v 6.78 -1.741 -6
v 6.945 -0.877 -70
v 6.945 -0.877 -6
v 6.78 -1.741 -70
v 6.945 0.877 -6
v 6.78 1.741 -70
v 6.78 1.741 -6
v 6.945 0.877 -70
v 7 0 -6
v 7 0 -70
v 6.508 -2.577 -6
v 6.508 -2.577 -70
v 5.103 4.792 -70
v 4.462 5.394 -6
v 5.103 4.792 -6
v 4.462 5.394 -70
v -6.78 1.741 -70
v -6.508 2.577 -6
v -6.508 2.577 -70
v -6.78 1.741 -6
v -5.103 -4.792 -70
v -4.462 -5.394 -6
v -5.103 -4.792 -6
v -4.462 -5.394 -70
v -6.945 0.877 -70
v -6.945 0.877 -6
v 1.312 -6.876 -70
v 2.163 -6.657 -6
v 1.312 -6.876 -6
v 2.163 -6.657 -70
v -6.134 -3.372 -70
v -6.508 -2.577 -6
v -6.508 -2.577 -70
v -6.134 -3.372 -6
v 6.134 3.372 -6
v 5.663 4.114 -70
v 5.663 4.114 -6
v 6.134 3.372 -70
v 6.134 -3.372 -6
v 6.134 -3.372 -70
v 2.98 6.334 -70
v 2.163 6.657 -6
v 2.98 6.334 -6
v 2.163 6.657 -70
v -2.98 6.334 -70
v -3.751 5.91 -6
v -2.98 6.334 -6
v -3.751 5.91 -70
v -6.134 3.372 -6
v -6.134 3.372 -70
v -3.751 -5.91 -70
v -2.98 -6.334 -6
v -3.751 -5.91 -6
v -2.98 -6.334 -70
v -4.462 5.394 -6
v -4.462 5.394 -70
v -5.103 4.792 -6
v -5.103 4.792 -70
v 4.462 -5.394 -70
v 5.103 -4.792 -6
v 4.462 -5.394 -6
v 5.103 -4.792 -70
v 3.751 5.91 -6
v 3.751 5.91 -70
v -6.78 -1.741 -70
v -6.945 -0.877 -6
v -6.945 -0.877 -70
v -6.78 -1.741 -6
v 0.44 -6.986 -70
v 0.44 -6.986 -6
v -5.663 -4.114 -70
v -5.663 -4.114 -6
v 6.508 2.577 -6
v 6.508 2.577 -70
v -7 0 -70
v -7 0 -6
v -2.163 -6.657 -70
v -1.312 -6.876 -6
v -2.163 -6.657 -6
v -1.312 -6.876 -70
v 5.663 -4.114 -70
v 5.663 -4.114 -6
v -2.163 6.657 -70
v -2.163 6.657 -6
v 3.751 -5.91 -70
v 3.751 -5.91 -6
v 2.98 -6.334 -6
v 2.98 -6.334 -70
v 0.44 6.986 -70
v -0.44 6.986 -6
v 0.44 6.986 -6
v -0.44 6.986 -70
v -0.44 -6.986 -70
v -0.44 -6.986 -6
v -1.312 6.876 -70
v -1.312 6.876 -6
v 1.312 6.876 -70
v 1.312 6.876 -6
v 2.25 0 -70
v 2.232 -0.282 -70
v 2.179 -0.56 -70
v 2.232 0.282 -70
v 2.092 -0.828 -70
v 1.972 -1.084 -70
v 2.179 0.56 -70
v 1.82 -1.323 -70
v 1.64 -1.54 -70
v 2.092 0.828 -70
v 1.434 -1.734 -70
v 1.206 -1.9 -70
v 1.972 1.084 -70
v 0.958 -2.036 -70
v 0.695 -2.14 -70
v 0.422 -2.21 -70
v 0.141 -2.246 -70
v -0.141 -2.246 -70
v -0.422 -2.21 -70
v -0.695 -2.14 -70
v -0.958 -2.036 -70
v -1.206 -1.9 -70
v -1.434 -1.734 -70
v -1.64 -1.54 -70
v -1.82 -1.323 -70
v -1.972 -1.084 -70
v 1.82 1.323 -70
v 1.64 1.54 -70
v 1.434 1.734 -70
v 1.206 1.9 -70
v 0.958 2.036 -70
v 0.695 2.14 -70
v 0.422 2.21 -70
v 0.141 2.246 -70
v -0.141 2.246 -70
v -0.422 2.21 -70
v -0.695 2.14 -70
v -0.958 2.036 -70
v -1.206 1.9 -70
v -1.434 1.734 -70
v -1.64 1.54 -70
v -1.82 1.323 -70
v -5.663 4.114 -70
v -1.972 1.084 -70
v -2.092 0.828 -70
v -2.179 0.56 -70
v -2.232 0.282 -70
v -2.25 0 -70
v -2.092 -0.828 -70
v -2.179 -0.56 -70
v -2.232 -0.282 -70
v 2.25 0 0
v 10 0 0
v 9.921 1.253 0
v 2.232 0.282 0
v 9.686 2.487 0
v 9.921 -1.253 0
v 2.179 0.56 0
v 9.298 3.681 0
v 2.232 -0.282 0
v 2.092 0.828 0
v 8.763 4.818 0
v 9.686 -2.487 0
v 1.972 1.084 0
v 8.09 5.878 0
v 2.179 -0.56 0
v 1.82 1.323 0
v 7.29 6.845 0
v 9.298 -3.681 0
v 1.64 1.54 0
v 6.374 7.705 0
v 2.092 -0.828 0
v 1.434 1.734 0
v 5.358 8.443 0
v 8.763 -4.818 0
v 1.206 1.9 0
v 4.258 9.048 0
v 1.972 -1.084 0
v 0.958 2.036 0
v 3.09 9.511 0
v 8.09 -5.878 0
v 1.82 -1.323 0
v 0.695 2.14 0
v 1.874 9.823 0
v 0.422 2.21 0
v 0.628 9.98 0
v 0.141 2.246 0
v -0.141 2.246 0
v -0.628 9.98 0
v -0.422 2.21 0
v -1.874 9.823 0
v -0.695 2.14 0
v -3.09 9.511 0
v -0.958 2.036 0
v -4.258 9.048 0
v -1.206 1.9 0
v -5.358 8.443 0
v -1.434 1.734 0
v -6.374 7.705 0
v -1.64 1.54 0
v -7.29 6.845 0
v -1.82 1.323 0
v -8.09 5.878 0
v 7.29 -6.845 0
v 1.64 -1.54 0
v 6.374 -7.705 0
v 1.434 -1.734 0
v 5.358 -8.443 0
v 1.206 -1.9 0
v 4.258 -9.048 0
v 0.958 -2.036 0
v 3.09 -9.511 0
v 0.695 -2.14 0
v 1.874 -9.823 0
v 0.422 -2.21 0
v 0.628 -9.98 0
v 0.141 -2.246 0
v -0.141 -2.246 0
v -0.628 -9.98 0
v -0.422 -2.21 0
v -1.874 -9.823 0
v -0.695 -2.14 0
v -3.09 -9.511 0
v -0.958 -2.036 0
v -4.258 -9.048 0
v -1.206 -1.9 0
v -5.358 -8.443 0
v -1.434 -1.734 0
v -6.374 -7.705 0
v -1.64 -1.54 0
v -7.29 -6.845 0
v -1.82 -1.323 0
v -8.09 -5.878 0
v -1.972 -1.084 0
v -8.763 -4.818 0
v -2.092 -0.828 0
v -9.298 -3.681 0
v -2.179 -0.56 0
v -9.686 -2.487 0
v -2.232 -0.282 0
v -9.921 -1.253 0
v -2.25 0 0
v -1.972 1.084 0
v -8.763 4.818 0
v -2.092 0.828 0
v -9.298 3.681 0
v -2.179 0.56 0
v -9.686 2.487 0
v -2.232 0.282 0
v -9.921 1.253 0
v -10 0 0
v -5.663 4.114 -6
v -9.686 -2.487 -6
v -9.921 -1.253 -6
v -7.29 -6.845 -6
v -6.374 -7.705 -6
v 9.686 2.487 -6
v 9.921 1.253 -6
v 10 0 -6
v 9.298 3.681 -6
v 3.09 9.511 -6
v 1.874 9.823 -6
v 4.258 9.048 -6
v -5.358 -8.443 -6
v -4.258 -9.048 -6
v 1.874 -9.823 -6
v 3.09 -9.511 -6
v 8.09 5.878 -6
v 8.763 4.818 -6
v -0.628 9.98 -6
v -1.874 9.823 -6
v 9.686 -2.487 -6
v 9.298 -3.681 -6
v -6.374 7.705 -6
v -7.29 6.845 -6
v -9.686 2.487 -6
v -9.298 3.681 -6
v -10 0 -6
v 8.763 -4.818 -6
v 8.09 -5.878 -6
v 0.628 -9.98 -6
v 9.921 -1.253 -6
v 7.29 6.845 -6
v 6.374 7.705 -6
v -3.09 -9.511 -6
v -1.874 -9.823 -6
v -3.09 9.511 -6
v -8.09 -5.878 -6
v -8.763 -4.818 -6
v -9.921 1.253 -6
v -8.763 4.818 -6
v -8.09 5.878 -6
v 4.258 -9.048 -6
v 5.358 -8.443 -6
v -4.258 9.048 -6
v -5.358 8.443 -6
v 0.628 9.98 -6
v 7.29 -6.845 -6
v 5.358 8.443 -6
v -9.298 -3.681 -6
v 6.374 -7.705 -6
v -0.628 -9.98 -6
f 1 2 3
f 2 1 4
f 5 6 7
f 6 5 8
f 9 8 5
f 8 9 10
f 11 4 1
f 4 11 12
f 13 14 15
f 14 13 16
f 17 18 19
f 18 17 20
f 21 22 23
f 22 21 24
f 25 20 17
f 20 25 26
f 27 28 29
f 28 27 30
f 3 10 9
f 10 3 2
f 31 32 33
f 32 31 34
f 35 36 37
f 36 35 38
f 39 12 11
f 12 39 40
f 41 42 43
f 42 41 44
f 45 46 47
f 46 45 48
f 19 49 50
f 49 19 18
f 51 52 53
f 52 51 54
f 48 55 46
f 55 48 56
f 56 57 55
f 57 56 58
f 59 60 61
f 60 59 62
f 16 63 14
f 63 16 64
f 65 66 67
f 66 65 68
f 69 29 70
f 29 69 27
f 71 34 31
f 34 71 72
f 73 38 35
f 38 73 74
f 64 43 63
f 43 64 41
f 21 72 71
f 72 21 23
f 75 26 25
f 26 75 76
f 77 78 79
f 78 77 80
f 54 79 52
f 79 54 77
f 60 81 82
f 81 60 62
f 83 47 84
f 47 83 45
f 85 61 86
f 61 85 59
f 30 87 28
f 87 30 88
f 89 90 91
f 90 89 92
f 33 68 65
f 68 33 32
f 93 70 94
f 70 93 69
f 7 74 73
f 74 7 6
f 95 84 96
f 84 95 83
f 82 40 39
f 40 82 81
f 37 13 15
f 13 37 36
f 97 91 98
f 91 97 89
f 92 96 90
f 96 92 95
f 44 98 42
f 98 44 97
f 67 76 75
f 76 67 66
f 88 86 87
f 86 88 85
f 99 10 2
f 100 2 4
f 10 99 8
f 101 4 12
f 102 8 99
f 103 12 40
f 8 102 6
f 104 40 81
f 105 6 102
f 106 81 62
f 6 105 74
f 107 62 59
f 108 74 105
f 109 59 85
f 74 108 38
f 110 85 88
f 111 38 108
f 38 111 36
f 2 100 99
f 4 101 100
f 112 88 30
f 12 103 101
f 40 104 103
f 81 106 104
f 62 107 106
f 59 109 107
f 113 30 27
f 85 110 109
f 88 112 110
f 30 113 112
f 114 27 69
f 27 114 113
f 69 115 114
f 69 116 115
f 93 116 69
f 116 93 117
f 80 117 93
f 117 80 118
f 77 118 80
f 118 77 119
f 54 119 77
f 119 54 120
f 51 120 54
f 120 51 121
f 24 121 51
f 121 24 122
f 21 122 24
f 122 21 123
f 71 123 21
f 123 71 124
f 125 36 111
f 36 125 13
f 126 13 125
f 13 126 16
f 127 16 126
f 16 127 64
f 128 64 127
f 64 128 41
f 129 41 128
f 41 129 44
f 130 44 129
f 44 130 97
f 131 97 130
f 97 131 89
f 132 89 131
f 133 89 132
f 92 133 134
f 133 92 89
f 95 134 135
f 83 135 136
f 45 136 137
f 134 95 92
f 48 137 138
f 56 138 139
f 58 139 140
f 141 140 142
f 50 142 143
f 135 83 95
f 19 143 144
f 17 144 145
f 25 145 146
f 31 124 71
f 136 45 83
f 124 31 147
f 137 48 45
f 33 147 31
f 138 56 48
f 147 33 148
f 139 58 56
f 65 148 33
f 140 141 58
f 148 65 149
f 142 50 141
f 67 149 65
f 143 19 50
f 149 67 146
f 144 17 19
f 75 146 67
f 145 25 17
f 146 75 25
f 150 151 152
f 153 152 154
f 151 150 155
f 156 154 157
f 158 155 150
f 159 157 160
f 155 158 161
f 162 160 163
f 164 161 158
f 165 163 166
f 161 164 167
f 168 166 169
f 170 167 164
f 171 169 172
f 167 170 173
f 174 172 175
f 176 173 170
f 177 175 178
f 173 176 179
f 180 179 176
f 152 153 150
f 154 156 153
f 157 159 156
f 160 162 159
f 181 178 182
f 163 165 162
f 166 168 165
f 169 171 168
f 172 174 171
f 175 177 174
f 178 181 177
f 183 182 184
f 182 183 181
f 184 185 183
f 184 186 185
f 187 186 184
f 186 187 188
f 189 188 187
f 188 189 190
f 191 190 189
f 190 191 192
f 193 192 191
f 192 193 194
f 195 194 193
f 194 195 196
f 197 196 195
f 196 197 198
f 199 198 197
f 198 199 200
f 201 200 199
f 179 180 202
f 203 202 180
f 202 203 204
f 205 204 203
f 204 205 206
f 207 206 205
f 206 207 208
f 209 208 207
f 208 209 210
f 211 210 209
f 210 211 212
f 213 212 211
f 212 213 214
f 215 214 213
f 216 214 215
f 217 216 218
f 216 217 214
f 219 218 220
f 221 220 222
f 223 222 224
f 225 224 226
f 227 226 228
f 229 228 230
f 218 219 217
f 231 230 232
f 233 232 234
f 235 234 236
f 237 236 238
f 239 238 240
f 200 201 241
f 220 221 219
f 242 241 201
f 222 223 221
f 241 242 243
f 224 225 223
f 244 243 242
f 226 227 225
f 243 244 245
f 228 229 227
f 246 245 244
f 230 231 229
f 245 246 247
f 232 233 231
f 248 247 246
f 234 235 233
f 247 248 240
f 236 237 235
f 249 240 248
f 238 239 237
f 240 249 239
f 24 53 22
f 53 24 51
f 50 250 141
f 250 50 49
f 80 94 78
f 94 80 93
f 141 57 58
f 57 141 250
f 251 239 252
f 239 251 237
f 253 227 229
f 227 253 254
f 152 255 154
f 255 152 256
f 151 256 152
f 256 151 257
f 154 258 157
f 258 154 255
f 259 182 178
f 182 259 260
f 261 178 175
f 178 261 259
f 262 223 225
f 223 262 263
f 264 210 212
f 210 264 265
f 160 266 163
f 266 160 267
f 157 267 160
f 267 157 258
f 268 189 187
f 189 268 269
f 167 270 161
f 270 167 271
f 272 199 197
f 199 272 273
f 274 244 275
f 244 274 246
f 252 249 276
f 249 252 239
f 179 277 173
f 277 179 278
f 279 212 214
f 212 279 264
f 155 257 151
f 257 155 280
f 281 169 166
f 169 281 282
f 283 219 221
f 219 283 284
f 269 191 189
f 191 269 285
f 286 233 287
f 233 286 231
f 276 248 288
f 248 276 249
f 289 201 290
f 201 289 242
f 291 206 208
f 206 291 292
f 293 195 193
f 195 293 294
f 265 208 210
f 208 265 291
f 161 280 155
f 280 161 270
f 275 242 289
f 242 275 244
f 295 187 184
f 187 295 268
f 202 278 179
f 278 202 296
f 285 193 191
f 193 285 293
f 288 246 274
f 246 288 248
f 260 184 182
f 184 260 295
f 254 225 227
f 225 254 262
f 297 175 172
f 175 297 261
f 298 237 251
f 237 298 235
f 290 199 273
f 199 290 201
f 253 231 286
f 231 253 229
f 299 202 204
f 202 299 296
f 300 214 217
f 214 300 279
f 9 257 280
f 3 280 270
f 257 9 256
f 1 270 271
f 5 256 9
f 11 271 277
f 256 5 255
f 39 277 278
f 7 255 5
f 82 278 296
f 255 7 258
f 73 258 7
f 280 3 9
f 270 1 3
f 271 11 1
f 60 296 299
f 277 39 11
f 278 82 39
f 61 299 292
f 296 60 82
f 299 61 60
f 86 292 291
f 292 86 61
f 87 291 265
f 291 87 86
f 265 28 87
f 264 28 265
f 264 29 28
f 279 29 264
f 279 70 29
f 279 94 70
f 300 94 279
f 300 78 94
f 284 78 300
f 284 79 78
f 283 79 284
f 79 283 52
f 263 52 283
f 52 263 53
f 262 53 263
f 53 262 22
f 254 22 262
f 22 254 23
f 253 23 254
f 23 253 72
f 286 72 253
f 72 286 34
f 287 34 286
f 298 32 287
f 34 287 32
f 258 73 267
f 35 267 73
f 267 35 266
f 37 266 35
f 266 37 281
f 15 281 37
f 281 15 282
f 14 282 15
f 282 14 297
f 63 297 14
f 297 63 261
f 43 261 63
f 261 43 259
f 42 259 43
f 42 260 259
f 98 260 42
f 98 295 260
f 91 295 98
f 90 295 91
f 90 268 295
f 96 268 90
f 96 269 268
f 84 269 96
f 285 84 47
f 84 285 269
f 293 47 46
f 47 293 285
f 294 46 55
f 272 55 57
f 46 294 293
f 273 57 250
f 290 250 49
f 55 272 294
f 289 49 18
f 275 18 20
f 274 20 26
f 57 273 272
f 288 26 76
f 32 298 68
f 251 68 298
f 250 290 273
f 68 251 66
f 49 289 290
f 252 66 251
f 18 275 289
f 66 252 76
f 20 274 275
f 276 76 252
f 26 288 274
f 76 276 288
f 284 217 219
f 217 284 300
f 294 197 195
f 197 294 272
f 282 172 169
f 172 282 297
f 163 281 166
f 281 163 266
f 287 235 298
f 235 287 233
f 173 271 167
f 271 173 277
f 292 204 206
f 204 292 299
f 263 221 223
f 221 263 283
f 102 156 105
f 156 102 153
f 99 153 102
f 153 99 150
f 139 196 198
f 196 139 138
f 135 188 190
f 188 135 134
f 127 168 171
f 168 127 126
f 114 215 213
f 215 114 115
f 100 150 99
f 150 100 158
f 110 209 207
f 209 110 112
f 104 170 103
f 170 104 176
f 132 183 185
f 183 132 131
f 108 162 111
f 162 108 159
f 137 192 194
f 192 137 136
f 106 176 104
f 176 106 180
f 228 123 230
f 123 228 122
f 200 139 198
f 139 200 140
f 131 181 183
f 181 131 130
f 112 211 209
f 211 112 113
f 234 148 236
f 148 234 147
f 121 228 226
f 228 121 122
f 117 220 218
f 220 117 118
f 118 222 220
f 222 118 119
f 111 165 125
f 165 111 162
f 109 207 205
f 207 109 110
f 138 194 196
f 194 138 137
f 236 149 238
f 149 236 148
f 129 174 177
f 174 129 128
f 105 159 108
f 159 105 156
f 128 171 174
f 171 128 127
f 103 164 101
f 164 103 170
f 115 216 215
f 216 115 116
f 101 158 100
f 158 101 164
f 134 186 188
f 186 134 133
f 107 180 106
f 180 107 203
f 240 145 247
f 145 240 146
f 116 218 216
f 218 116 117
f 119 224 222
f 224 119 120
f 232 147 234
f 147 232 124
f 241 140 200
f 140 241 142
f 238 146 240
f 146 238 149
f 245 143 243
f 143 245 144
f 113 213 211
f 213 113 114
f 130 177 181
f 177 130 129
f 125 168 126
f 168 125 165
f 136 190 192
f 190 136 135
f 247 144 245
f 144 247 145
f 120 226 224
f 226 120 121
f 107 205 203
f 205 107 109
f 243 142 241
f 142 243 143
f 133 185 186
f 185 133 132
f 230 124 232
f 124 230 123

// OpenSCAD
$fn = 50;


difference() {
	union() {
		translate(v = [0, 0, -70.0000000000]) {
			cylinder(h = 70, r = 7.0000000000);
		}
		translate(v = [0, 0, -6.0000000000]) {
			cylinder(h = 6, r = 10.0000000000);
		}
	}
	union() {
		#translate(v = [0, 0, -70]) {
			cylinder(h = 70, r = 2.2500000000);
		}
	}
}
